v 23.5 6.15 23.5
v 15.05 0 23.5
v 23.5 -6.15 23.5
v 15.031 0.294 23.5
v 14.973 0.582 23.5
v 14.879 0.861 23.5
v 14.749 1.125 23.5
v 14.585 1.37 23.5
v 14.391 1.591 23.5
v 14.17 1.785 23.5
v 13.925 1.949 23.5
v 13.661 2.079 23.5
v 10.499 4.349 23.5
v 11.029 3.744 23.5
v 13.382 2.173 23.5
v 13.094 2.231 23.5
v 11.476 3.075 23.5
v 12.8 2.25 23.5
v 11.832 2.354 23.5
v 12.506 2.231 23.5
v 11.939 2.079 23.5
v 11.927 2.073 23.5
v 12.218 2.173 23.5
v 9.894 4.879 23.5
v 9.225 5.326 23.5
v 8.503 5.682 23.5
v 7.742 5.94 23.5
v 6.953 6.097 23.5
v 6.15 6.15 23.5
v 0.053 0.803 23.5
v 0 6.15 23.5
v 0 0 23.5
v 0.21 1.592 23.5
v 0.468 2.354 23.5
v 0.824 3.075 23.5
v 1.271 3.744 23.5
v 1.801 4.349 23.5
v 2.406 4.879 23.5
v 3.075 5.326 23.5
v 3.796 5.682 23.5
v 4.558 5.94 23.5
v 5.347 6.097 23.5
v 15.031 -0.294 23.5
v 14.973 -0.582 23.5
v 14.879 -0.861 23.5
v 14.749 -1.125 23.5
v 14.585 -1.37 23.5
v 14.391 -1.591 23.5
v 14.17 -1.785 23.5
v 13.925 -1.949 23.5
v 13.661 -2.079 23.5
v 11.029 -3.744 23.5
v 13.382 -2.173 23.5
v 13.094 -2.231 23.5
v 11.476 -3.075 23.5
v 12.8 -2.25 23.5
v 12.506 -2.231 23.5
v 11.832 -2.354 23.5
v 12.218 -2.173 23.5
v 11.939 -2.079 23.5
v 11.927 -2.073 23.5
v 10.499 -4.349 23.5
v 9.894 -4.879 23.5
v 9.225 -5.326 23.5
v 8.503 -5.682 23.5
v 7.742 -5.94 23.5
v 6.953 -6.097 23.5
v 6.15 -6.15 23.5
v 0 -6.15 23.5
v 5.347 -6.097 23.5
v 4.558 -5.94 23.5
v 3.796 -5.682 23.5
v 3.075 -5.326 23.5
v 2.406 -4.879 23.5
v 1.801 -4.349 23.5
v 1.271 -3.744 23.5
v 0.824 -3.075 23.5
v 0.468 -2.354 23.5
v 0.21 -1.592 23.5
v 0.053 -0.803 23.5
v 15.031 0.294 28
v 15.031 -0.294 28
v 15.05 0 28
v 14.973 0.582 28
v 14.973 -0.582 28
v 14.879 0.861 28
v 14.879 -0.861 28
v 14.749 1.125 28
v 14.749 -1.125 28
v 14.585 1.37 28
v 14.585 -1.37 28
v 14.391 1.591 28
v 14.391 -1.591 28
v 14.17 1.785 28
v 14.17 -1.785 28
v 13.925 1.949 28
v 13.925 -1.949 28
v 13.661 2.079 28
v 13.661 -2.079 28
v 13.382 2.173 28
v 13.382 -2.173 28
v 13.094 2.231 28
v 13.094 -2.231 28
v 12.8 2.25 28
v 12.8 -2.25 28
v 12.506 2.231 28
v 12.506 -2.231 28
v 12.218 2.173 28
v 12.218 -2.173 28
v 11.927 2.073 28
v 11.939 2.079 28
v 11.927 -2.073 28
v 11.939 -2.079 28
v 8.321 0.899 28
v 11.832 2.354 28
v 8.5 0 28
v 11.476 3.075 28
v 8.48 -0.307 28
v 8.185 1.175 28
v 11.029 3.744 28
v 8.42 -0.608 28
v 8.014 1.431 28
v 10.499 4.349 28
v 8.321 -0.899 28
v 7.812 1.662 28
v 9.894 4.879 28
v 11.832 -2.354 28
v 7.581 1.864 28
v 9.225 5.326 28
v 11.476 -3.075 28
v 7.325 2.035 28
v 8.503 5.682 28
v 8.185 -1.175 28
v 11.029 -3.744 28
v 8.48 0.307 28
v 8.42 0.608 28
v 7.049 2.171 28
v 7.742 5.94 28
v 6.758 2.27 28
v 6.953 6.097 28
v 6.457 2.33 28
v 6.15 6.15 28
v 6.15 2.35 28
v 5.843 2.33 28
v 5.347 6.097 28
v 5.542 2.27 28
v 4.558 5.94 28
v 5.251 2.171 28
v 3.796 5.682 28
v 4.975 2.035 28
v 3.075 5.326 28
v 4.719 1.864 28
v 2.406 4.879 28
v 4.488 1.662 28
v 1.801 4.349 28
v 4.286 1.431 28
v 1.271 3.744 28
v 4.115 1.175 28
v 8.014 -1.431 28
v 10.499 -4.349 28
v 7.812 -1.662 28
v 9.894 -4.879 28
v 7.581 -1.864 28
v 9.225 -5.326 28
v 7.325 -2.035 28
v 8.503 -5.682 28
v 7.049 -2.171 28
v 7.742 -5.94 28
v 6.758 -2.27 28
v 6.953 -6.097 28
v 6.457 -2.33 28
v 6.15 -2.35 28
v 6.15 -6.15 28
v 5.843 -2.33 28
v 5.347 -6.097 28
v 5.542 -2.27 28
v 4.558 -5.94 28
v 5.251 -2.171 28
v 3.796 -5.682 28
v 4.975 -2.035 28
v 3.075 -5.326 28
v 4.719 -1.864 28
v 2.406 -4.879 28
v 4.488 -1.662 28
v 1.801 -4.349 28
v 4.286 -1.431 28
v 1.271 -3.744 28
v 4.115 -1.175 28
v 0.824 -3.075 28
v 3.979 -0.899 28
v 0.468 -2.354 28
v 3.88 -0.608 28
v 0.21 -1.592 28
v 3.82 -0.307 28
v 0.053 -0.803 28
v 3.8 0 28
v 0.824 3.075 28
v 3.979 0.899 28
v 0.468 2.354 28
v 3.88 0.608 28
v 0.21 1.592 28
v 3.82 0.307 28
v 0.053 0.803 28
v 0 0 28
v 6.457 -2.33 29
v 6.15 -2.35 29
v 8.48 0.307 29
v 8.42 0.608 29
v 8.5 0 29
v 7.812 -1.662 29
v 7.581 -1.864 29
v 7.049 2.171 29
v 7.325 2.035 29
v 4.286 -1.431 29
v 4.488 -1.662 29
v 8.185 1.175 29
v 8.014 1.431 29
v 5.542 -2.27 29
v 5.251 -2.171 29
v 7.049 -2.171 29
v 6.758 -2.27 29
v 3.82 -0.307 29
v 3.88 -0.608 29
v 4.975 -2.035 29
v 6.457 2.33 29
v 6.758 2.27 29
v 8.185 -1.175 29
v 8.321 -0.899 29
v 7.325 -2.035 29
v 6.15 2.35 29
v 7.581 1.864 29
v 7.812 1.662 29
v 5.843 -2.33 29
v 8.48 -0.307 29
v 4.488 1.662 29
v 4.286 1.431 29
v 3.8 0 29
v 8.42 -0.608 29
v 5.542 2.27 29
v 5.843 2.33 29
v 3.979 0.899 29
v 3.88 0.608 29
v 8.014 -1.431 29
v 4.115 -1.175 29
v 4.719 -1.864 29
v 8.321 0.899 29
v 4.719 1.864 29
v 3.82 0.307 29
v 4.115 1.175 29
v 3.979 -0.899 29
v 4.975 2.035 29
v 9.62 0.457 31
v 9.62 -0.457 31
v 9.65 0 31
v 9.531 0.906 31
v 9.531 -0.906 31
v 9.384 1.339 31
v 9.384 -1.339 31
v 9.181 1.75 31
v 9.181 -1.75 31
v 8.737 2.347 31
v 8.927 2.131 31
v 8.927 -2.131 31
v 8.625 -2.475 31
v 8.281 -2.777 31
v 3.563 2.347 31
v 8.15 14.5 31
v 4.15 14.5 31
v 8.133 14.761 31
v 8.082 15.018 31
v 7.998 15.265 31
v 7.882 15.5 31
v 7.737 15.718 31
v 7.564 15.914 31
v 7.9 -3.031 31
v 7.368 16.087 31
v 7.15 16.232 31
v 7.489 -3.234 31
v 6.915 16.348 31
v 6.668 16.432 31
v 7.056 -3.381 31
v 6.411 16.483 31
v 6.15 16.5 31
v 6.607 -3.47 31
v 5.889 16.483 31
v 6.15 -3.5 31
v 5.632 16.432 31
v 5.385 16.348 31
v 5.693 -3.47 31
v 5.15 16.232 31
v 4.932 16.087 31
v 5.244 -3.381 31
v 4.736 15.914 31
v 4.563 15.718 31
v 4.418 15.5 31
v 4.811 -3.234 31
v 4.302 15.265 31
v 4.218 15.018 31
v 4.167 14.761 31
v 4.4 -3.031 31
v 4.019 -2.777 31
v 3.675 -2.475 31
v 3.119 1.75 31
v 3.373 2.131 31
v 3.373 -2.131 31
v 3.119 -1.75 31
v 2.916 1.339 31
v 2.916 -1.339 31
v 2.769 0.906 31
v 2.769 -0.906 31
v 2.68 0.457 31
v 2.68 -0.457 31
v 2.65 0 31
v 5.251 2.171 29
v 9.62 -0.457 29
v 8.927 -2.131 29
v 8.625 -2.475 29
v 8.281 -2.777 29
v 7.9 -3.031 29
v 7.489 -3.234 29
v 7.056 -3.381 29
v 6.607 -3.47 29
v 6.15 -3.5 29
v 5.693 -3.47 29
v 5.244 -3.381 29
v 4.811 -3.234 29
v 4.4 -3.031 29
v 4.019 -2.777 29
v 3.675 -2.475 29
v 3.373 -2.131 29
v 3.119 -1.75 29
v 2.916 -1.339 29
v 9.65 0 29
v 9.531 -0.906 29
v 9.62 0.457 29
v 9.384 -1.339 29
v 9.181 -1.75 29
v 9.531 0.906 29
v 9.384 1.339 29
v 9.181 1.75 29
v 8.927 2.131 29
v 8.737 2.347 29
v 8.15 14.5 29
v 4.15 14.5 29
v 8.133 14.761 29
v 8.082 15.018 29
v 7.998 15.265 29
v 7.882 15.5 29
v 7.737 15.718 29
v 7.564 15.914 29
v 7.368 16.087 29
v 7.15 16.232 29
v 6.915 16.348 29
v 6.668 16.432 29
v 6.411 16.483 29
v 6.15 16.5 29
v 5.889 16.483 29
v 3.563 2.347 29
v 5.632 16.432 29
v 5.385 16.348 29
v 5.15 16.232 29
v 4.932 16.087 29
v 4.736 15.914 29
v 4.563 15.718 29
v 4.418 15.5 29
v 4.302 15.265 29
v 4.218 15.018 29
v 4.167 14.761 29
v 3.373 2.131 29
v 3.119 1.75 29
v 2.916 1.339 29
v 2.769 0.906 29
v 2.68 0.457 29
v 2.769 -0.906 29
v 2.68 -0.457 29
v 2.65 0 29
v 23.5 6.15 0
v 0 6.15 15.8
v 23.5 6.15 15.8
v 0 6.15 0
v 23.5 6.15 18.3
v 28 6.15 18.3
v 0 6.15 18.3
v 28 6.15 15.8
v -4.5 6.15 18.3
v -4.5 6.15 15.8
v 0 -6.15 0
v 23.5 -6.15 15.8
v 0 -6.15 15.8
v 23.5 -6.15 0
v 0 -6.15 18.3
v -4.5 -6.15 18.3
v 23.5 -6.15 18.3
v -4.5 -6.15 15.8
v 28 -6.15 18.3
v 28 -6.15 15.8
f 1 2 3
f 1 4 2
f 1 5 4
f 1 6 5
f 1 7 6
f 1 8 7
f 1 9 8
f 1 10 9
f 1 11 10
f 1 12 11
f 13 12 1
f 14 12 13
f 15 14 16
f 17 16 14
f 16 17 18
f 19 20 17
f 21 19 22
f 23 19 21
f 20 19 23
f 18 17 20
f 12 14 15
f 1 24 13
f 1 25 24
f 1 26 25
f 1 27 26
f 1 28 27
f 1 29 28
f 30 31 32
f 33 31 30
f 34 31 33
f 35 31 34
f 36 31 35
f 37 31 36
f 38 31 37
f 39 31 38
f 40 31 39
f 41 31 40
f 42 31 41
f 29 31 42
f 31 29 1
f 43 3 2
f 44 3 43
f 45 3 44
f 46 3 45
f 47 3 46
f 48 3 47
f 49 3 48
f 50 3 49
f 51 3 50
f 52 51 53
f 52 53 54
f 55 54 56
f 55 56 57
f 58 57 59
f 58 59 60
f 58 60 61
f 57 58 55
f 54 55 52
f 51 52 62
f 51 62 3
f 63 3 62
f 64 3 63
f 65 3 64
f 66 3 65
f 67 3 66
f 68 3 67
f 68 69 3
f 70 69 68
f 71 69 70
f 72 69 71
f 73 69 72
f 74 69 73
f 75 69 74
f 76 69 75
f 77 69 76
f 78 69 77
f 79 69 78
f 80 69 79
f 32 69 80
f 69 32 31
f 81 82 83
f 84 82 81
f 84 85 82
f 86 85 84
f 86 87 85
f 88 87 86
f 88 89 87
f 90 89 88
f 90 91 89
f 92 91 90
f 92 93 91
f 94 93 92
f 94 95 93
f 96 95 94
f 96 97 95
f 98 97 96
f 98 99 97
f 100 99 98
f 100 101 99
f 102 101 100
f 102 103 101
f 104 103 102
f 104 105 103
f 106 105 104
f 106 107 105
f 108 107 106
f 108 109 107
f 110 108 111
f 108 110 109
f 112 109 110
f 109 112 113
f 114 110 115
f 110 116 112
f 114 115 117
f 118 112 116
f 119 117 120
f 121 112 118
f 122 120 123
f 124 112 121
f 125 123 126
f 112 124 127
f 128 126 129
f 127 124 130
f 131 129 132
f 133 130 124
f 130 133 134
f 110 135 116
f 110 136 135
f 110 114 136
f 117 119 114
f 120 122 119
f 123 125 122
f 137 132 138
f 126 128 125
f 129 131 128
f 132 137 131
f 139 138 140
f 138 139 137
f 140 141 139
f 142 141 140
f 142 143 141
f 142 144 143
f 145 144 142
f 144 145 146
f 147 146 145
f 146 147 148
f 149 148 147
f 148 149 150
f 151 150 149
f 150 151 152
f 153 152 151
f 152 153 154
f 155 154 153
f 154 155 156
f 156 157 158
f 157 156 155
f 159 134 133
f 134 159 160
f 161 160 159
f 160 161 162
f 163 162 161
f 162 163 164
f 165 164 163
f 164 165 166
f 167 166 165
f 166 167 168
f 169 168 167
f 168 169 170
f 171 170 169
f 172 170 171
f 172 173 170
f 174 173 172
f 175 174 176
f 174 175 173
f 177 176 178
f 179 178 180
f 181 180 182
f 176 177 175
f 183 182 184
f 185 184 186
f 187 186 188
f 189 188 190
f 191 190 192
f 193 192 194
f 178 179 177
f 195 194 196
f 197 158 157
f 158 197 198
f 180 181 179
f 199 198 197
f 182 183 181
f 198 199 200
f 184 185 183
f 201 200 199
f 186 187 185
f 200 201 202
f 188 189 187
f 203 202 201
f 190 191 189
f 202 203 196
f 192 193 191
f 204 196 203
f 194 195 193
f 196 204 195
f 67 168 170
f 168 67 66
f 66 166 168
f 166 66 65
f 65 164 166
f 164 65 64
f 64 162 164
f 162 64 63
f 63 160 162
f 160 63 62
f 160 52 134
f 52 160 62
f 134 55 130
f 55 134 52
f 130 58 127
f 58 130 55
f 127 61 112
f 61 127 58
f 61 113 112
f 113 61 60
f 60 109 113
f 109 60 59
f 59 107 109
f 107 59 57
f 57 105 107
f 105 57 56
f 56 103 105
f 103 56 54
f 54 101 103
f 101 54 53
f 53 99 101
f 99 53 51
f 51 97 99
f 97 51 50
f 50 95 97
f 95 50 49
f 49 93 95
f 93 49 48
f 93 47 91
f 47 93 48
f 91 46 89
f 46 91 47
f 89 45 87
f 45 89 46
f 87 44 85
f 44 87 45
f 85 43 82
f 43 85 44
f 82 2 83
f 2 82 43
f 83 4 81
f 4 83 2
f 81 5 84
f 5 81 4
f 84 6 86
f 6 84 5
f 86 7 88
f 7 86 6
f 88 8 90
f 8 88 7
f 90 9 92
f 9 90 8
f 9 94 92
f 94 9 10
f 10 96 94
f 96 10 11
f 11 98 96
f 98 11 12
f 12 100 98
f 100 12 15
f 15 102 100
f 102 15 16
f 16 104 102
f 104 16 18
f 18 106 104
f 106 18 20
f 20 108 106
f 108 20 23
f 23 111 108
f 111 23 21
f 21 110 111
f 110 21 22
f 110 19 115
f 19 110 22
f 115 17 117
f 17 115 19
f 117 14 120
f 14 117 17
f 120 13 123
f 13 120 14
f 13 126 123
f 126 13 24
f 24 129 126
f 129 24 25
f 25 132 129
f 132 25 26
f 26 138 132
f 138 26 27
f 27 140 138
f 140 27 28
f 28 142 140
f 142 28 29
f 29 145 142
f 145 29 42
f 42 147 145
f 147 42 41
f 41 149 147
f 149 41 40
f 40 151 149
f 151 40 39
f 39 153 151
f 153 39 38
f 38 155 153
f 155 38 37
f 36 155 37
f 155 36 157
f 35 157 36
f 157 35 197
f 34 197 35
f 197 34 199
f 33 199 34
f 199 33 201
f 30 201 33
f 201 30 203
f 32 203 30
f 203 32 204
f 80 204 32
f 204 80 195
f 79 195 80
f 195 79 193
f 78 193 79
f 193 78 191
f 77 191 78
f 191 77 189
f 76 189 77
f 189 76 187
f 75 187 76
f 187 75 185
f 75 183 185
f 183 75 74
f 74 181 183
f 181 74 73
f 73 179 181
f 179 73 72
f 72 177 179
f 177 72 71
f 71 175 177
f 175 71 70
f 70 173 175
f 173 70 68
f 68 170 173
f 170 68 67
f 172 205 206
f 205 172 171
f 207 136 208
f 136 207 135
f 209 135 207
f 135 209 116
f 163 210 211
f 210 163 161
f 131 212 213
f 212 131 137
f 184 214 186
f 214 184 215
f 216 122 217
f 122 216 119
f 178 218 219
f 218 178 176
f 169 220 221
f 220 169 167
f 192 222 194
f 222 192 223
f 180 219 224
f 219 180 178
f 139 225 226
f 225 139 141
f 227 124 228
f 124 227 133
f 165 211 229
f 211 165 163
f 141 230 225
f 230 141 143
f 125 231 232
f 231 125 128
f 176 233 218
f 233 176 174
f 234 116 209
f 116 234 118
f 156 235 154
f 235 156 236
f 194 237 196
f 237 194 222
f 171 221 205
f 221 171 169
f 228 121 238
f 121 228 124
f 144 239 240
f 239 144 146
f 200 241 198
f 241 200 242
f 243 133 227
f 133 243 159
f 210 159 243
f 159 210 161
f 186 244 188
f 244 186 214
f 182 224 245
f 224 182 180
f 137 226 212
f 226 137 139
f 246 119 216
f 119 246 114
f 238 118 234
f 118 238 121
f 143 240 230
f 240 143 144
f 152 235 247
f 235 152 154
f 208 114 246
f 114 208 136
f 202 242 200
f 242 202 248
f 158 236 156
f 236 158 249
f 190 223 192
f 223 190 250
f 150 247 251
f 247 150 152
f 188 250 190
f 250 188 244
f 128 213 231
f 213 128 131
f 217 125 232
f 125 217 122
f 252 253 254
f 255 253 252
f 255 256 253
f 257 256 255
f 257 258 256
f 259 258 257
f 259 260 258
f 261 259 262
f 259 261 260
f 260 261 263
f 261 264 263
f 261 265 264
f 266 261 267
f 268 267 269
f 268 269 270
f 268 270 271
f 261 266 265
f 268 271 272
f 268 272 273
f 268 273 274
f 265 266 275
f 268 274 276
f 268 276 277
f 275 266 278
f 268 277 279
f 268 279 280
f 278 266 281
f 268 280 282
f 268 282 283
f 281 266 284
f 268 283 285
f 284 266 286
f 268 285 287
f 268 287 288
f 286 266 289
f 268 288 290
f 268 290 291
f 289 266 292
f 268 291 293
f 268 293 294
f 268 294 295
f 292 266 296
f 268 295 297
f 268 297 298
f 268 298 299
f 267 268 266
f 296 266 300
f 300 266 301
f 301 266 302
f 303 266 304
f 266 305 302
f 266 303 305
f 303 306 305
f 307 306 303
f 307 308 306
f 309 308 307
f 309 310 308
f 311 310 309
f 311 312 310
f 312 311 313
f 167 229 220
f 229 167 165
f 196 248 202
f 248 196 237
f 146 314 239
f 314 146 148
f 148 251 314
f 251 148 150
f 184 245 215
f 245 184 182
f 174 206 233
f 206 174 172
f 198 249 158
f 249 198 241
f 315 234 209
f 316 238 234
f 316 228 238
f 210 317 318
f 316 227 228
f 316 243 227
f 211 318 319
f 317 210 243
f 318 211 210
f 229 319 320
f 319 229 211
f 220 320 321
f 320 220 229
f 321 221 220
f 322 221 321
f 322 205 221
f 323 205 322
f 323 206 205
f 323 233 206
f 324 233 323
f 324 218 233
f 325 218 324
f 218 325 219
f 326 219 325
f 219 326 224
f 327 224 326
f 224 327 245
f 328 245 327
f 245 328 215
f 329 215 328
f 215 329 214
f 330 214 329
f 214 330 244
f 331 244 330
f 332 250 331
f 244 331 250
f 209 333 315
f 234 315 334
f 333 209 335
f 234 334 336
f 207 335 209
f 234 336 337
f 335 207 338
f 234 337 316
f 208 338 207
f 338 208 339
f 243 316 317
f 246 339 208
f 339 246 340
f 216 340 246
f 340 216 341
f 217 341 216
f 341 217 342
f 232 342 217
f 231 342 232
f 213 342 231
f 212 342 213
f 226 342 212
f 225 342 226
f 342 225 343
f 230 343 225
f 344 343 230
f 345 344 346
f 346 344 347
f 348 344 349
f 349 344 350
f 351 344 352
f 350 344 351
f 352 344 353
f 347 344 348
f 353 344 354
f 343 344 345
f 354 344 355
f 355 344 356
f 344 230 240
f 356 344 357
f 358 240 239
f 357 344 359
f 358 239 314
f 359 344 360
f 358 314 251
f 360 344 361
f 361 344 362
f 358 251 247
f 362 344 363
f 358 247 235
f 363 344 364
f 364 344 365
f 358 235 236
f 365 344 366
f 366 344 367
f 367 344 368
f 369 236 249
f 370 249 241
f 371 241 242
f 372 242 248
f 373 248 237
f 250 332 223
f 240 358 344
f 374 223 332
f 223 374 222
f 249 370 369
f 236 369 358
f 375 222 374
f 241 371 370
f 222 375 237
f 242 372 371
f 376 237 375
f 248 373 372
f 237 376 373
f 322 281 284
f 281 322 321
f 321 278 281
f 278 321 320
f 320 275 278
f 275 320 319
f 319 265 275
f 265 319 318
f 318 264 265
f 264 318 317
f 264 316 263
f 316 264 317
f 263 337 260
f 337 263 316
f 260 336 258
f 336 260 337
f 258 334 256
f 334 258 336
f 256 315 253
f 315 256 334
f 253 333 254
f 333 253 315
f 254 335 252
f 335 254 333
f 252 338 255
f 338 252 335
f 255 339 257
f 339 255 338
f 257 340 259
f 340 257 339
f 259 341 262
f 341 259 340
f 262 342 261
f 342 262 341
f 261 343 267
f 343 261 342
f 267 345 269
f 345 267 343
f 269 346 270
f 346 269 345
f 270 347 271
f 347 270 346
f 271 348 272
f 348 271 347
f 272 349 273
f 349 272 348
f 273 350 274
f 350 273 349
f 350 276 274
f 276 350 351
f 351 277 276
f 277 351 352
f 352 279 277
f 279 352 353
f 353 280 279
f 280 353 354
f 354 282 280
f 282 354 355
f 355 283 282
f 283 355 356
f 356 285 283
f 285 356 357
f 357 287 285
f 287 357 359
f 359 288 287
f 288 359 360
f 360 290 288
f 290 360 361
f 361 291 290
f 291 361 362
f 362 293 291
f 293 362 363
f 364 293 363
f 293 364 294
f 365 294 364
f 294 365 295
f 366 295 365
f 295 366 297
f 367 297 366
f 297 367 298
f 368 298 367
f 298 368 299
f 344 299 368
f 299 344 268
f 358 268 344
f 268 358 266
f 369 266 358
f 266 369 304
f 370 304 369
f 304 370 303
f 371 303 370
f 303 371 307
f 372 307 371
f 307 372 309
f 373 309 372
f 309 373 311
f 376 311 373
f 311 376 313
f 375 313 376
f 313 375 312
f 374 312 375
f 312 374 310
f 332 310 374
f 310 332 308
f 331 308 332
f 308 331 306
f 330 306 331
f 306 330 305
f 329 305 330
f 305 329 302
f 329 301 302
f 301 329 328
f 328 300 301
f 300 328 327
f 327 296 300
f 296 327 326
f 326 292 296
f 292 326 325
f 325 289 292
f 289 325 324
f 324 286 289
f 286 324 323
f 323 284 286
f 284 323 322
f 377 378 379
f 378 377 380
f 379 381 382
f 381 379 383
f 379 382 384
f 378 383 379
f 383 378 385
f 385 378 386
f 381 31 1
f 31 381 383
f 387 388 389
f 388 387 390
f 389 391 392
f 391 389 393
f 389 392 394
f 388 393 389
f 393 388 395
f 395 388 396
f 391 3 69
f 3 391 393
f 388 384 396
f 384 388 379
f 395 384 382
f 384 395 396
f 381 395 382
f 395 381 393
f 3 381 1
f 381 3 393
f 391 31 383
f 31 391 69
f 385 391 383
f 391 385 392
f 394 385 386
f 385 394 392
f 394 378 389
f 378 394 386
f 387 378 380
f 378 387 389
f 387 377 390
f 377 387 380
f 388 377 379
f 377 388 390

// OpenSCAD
SERVO_WIDTH = 23.5;
SERVO_HEIGHT=23.5;
SERVO_DEPTH=12.3;
SERVO_OUTPUT=4.5;

MOUNT_WIDTH=32.5;
MOUNT_HEIGHT= 2.5;
MOUNT_DEPTH=12.3;
MOUNT_OFFSET=15.8;



servo9g();

module servo9g() {
    $fn=48;
   
    color("Blue")
    translate([SERVO_DEPTH/2, 0, SERVO_HEIGHT]) {
        linear_extrude(SERVO_OUTPUT) {
            translate([(1+SERVO_DEPTH)/2,0, 0]) circle(4.5/2);
            circle(SERVO_DEPTH/2);
        }
    }
    color("White")
    translate([SERVO_DEPTH/2, 0, SERVO_HEIGHT+SERVO_OUTPUT]) {
        linear_extrude(3) {
            circle(4.7/2);
        }
    }
    color("White")
    translate([SERVO_DEPTH/2, 0, SERVO_HEIGHT+SERVO_OUTPUT+1]) {
        linear_extrude(2) {
            circle(7/2);
            hull() {
                circle(5.4/2);
                translate([0, 14.5, 0]) circle(4/2);
            }

        }
    }
    color("Blue")
    translate([0, SERVO_DEPTH/2, 0]) 
        rotate([90,0,0]) 
            linear_extrude(SERVO_DEPTH) {
                square([SERVO_WIDTH, SERVO_HEIGHT]);
                translate([(SERVO_WIDTH-MOUNT_WIDTH)/2, MOUNT_OFFSET])
                    square([MOUNT_WIDTH, MOUNT_HEIGHT]);
            }
}
